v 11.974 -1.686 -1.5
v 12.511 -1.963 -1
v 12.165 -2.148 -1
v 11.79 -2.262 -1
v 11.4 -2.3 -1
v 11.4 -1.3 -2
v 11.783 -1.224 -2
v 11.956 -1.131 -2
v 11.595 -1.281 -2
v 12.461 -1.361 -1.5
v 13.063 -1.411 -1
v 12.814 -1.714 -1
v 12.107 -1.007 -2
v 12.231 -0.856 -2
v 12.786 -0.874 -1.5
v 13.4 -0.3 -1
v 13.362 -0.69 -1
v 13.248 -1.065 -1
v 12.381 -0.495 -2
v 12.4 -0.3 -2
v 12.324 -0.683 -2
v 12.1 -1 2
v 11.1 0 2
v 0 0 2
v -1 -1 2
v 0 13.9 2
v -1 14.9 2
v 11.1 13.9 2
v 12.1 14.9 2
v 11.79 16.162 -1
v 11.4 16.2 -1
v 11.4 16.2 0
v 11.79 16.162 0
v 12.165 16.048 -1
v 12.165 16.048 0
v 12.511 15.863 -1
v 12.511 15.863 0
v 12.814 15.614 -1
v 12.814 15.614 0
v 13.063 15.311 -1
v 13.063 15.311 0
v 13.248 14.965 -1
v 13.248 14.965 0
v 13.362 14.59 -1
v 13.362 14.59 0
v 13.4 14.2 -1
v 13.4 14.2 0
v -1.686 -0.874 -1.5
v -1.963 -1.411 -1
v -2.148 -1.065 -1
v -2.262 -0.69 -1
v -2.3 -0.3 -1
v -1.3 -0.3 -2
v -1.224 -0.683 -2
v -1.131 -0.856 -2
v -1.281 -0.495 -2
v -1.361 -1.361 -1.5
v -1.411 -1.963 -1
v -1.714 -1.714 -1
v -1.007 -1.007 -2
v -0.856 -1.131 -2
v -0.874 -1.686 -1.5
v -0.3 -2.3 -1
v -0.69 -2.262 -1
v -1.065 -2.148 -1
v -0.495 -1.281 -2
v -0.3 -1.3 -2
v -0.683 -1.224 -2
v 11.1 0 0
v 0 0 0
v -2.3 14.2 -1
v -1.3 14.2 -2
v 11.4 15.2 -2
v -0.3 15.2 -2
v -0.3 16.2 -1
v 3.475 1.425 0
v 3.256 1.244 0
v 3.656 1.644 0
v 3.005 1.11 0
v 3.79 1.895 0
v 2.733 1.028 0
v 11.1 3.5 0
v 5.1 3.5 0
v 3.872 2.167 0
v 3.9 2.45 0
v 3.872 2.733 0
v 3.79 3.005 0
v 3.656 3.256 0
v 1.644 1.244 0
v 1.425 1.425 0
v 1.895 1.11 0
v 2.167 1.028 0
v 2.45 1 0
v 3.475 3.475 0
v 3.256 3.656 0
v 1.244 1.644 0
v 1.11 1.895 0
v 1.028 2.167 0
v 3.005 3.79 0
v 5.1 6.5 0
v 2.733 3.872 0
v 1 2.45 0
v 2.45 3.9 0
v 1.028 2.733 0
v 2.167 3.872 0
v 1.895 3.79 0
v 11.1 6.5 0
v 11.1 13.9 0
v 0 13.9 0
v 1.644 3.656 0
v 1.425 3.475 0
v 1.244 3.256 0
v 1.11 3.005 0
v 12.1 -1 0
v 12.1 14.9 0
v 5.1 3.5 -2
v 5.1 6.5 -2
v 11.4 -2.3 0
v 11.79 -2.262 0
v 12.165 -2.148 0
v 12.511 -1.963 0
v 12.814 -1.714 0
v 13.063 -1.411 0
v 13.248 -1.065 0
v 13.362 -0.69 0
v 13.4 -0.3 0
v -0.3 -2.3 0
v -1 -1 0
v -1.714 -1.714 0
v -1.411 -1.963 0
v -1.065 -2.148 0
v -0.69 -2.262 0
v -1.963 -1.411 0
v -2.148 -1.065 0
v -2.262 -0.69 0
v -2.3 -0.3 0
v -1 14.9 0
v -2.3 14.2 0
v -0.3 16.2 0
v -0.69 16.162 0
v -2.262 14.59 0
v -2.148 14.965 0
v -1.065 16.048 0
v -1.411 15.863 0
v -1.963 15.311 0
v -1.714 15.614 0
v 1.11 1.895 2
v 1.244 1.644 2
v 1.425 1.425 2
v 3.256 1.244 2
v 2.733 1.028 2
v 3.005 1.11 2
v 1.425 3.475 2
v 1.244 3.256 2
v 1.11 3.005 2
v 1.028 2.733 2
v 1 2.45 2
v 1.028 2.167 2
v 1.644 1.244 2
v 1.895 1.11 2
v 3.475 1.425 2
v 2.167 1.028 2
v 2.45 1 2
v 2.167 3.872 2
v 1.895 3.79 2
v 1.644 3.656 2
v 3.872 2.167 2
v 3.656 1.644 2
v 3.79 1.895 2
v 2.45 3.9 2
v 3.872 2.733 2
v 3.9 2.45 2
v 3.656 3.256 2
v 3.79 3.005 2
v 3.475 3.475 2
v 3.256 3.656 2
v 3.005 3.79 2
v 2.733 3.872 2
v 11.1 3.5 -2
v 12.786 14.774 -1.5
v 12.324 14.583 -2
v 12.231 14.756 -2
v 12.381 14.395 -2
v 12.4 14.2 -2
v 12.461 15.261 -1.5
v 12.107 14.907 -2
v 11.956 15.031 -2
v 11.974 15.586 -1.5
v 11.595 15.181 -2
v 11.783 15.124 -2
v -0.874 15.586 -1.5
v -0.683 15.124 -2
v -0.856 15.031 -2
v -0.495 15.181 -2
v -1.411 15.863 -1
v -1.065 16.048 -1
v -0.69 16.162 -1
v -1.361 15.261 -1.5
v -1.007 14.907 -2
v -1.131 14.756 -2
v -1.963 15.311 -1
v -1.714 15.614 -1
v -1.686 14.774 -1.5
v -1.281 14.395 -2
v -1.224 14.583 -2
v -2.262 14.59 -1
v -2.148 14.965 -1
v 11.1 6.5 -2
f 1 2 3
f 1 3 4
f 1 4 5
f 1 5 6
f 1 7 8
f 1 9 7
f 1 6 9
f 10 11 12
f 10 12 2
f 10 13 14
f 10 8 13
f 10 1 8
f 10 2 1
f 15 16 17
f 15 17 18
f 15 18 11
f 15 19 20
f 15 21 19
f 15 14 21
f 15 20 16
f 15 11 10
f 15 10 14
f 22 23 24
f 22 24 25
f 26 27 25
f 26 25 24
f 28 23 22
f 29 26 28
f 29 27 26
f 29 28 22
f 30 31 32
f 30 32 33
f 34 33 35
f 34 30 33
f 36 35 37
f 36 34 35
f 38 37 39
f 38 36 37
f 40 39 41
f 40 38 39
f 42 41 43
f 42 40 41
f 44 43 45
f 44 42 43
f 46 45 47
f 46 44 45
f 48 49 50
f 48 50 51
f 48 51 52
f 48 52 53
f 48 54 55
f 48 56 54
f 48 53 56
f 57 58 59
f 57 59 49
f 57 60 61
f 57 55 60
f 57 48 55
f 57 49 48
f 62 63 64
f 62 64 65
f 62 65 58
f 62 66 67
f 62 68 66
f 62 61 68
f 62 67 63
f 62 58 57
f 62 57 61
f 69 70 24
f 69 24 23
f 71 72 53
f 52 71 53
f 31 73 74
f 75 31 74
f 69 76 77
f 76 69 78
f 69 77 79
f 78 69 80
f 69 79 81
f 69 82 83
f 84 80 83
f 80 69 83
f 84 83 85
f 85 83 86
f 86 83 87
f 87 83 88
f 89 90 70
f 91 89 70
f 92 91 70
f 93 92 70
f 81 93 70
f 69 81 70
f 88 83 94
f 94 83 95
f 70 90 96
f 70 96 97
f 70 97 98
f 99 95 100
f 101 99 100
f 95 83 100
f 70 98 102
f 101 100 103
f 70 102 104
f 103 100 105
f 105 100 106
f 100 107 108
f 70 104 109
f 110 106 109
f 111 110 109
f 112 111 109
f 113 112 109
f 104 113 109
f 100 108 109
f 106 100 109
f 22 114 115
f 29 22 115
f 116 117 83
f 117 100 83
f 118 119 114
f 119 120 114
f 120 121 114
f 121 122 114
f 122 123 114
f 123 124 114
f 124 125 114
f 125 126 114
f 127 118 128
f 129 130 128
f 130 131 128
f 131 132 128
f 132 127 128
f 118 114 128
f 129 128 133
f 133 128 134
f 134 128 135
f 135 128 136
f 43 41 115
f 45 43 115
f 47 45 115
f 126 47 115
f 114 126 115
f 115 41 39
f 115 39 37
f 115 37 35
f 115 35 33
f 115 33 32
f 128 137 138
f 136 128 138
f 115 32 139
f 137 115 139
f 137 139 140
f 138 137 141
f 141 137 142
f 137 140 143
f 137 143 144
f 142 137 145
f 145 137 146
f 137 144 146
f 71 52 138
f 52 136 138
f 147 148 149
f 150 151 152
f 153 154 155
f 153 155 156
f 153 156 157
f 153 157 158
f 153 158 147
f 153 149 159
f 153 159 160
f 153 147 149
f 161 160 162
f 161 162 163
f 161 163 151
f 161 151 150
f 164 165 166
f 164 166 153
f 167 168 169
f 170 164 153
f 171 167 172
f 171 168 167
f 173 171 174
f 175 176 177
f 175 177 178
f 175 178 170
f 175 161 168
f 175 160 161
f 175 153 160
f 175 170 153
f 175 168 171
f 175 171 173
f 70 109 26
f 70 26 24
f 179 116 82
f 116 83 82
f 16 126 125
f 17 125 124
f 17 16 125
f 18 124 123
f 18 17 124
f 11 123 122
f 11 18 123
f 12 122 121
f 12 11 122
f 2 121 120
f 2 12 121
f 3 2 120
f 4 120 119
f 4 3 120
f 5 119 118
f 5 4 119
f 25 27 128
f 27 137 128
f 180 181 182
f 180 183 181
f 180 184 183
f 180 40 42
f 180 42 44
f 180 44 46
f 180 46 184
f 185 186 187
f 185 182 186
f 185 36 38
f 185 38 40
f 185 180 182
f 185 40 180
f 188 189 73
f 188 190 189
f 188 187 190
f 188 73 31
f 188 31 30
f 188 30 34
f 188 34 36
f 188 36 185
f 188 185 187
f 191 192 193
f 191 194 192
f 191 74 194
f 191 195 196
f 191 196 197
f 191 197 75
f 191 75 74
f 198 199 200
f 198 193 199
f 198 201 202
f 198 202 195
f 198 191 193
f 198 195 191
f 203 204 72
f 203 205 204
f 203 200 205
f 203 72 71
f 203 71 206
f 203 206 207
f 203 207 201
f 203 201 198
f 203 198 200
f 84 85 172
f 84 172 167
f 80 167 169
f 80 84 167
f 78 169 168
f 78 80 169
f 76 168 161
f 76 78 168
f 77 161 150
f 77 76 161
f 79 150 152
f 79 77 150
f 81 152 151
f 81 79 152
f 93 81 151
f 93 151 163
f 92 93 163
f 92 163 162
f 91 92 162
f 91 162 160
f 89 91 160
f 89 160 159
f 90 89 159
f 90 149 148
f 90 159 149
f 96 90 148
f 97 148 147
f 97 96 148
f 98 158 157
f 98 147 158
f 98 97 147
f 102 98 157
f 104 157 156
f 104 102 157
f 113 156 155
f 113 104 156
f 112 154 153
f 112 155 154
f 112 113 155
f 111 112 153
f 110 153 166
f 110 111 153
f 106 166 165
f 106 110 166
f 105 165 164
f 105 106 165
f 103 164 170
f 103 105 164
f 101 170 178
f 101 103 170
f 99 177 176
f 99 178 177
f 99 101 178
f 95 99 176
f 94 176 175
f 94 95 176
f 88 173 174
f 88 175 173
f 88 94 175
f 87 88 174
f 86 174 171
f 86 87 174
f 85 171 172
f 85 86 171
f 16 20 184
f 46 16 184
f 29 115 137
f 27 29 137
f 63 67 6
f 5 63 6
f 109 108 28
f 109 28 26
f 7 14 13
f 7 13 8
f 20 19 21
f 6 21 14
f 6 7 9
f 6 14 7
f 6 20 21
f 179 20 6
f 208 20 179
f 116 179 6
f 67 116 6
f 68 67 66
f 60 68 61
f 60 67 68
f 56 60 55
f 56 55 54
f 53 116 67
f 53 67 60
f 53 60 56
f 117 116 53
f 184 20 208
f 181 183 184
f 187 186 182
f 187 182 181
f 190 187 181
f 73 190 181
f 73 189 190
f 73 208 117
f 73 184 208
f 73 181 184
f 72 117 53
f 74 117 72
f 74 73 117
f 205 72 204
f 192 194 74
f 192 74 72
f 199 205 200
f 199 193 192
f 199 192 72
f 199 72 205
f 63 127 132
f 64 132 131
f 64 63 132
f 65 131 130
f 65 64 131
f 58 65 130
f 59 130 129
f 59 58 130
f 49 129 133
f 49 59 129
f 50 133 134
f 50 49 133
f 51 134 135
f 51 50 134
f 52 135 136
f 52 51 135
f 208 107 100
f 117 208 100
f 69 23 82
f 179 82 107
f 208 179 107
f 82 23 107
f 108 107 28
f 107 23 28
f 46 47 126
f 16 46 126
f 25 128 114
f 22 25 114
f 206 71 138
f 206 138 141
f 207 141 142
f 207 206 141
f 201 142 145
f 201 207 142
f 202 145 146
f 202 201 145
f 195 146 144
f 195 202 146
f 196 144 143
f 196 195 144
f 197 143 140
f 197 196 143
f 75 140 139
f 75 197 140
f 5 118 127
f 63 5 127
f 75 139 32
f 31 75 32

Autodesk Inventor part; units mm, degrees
ref_plane "YZ Plane" through (0, 0, 0) normal (1, 0, 0) x (0, 1, 0)
ref_plane "XZ Plane" through (0, 0, 0) normal (0, 1, 0) x (-1, 0, 0)
ref_plane "XY Plane" through (0, 0, 0) normal (0, 0, 1) x (1, 0, 0)
sketch "Sketch1" plane through (0, 0, 0) normal (0, 0, 1) x (1, 0, 0)
  point P0 (0, 0)
sketch "Sketch2" plane through (0, 0, 0) normal (0, 0, 1) x (1, 0, 0)
  point P0 (0, 0)
sketch "Sketch3" plane through (0, 0, 0) normal (0, 0, 1) x (1, 0, 0)
  line L0 (0, 0) -> (11.1, 0)
  line L1 (11.1, 0) -> (11.1, 13.9)
  line L2 (11.1, 13.9) -> (0, 13.9)
  line L3 (0, 13.9) -> (0, 0)
  line L4 (-1, -1) -> (12.1, -1)
  line L5 (12.1, -1) -> (12.1, 14.9)
  line L6 (12.1, 14.9) -> (-1, 14.9)
  line L7 (-1, 14.9) -> (-1, -1)
  dimension "d0" = 13.9
  dimension "d1" = 11.1
  dimension "d7" = 1
extrude "Extrusion1" add sketch "Sketch3" along normal blind 2
sketch "Sketch5" plane through (0, 0, 0) normal (0, 0, -1) x (-1, 0, 0)
  line L0 (-12.1, 14.9) -> (1, 14.9) projected
  line L1 (-12.1, -1) -> (-12.1, 14.9) projected
  line L2 (1, 14.9) -> (1, -1) projected
  line L3 (1, -1) -> (-12.1, -1) projected
  line L4 (2.3, 16.2) -> (-13.4, 16.2)
  line L5 (-13.4, 16.2) -> (-13.4, -2.3)
  line L6 (-13.4, -2.3) -> (2.3, -2.3)
  line L7 (2.3, -2.3) -> (2.3, 16.2)
  point P0 (0, 0)
  dimension "d8" = 1.3
extrude "Extrusion2" add sketch "Sketch5" along normal blind 2 contours L0 L2 L3 L1 | L7 L6 L5 L4
sketch "Sketch6" plane through (0, 0, 0) normal (0, 0, 1) x (1, 0, 0)
  circle A0 centre (2.45, 2.45) radius 1.45
  line L0 (0, 0) -> (0, 13.9) projected
  line L1 (11.1, 0) -> (0, 0) projected
  dimension "d11" = 2.9
  dimension "d12" = 2.45
  dimension "d13" = 2.45
extrude "Extrusion3" add sketch "Sketch6" along normal blind 2
sketch "Sketch7" plane through (0, 0, 0) normal (0, 0, 1) x (1, 0, 0)
  line L0 (5.1, 3.5) -> (11.1, 3.5)
  line L1 (11.1, 3.5) -> (11.1, 6.5)
  line L2 (11.1, 6.5) -> (5.1, 6.5)
  line L3 (5.1, 6.5) -> (5.1, 3.5)
  line L4 (0, 0) -> (0, 13.9) projected
  line L5 (11.1, 0) -> (0, 0) projected
  line L6 (11.1, 13.9) -> (11.1, 0) projected
  dimension "d16" = 3
  dimension "d17" = 6
  dimension "d22" = 3.5
  dimension "d23" = 0
extrude "Extrusion4" cut sketch "Sketch7" against normal blind 2
fillet "Fillet1" radius 2 4 edges at (13.4, 16.2, -1) (-2.3, 16.2, -1) (13.4, -2.3, -1) (-2.3, -2.3, -1)
chamfer "Chamfer1" distance 1 angle 45 8 edges at (5.55, 16.2, -2) (12.8142, 15.6142, -2) (13.4, 6.95, -2) (12.8142, -1.7142, -2) (5.55, -2.3, -2) (-1.7142, -1.7142, -2) (-2.3, 6.95, -2) (-1.7142, 15.6142, -2)
equation "\"d13\" = d12"
properties part number "VL53L0X_cover"
